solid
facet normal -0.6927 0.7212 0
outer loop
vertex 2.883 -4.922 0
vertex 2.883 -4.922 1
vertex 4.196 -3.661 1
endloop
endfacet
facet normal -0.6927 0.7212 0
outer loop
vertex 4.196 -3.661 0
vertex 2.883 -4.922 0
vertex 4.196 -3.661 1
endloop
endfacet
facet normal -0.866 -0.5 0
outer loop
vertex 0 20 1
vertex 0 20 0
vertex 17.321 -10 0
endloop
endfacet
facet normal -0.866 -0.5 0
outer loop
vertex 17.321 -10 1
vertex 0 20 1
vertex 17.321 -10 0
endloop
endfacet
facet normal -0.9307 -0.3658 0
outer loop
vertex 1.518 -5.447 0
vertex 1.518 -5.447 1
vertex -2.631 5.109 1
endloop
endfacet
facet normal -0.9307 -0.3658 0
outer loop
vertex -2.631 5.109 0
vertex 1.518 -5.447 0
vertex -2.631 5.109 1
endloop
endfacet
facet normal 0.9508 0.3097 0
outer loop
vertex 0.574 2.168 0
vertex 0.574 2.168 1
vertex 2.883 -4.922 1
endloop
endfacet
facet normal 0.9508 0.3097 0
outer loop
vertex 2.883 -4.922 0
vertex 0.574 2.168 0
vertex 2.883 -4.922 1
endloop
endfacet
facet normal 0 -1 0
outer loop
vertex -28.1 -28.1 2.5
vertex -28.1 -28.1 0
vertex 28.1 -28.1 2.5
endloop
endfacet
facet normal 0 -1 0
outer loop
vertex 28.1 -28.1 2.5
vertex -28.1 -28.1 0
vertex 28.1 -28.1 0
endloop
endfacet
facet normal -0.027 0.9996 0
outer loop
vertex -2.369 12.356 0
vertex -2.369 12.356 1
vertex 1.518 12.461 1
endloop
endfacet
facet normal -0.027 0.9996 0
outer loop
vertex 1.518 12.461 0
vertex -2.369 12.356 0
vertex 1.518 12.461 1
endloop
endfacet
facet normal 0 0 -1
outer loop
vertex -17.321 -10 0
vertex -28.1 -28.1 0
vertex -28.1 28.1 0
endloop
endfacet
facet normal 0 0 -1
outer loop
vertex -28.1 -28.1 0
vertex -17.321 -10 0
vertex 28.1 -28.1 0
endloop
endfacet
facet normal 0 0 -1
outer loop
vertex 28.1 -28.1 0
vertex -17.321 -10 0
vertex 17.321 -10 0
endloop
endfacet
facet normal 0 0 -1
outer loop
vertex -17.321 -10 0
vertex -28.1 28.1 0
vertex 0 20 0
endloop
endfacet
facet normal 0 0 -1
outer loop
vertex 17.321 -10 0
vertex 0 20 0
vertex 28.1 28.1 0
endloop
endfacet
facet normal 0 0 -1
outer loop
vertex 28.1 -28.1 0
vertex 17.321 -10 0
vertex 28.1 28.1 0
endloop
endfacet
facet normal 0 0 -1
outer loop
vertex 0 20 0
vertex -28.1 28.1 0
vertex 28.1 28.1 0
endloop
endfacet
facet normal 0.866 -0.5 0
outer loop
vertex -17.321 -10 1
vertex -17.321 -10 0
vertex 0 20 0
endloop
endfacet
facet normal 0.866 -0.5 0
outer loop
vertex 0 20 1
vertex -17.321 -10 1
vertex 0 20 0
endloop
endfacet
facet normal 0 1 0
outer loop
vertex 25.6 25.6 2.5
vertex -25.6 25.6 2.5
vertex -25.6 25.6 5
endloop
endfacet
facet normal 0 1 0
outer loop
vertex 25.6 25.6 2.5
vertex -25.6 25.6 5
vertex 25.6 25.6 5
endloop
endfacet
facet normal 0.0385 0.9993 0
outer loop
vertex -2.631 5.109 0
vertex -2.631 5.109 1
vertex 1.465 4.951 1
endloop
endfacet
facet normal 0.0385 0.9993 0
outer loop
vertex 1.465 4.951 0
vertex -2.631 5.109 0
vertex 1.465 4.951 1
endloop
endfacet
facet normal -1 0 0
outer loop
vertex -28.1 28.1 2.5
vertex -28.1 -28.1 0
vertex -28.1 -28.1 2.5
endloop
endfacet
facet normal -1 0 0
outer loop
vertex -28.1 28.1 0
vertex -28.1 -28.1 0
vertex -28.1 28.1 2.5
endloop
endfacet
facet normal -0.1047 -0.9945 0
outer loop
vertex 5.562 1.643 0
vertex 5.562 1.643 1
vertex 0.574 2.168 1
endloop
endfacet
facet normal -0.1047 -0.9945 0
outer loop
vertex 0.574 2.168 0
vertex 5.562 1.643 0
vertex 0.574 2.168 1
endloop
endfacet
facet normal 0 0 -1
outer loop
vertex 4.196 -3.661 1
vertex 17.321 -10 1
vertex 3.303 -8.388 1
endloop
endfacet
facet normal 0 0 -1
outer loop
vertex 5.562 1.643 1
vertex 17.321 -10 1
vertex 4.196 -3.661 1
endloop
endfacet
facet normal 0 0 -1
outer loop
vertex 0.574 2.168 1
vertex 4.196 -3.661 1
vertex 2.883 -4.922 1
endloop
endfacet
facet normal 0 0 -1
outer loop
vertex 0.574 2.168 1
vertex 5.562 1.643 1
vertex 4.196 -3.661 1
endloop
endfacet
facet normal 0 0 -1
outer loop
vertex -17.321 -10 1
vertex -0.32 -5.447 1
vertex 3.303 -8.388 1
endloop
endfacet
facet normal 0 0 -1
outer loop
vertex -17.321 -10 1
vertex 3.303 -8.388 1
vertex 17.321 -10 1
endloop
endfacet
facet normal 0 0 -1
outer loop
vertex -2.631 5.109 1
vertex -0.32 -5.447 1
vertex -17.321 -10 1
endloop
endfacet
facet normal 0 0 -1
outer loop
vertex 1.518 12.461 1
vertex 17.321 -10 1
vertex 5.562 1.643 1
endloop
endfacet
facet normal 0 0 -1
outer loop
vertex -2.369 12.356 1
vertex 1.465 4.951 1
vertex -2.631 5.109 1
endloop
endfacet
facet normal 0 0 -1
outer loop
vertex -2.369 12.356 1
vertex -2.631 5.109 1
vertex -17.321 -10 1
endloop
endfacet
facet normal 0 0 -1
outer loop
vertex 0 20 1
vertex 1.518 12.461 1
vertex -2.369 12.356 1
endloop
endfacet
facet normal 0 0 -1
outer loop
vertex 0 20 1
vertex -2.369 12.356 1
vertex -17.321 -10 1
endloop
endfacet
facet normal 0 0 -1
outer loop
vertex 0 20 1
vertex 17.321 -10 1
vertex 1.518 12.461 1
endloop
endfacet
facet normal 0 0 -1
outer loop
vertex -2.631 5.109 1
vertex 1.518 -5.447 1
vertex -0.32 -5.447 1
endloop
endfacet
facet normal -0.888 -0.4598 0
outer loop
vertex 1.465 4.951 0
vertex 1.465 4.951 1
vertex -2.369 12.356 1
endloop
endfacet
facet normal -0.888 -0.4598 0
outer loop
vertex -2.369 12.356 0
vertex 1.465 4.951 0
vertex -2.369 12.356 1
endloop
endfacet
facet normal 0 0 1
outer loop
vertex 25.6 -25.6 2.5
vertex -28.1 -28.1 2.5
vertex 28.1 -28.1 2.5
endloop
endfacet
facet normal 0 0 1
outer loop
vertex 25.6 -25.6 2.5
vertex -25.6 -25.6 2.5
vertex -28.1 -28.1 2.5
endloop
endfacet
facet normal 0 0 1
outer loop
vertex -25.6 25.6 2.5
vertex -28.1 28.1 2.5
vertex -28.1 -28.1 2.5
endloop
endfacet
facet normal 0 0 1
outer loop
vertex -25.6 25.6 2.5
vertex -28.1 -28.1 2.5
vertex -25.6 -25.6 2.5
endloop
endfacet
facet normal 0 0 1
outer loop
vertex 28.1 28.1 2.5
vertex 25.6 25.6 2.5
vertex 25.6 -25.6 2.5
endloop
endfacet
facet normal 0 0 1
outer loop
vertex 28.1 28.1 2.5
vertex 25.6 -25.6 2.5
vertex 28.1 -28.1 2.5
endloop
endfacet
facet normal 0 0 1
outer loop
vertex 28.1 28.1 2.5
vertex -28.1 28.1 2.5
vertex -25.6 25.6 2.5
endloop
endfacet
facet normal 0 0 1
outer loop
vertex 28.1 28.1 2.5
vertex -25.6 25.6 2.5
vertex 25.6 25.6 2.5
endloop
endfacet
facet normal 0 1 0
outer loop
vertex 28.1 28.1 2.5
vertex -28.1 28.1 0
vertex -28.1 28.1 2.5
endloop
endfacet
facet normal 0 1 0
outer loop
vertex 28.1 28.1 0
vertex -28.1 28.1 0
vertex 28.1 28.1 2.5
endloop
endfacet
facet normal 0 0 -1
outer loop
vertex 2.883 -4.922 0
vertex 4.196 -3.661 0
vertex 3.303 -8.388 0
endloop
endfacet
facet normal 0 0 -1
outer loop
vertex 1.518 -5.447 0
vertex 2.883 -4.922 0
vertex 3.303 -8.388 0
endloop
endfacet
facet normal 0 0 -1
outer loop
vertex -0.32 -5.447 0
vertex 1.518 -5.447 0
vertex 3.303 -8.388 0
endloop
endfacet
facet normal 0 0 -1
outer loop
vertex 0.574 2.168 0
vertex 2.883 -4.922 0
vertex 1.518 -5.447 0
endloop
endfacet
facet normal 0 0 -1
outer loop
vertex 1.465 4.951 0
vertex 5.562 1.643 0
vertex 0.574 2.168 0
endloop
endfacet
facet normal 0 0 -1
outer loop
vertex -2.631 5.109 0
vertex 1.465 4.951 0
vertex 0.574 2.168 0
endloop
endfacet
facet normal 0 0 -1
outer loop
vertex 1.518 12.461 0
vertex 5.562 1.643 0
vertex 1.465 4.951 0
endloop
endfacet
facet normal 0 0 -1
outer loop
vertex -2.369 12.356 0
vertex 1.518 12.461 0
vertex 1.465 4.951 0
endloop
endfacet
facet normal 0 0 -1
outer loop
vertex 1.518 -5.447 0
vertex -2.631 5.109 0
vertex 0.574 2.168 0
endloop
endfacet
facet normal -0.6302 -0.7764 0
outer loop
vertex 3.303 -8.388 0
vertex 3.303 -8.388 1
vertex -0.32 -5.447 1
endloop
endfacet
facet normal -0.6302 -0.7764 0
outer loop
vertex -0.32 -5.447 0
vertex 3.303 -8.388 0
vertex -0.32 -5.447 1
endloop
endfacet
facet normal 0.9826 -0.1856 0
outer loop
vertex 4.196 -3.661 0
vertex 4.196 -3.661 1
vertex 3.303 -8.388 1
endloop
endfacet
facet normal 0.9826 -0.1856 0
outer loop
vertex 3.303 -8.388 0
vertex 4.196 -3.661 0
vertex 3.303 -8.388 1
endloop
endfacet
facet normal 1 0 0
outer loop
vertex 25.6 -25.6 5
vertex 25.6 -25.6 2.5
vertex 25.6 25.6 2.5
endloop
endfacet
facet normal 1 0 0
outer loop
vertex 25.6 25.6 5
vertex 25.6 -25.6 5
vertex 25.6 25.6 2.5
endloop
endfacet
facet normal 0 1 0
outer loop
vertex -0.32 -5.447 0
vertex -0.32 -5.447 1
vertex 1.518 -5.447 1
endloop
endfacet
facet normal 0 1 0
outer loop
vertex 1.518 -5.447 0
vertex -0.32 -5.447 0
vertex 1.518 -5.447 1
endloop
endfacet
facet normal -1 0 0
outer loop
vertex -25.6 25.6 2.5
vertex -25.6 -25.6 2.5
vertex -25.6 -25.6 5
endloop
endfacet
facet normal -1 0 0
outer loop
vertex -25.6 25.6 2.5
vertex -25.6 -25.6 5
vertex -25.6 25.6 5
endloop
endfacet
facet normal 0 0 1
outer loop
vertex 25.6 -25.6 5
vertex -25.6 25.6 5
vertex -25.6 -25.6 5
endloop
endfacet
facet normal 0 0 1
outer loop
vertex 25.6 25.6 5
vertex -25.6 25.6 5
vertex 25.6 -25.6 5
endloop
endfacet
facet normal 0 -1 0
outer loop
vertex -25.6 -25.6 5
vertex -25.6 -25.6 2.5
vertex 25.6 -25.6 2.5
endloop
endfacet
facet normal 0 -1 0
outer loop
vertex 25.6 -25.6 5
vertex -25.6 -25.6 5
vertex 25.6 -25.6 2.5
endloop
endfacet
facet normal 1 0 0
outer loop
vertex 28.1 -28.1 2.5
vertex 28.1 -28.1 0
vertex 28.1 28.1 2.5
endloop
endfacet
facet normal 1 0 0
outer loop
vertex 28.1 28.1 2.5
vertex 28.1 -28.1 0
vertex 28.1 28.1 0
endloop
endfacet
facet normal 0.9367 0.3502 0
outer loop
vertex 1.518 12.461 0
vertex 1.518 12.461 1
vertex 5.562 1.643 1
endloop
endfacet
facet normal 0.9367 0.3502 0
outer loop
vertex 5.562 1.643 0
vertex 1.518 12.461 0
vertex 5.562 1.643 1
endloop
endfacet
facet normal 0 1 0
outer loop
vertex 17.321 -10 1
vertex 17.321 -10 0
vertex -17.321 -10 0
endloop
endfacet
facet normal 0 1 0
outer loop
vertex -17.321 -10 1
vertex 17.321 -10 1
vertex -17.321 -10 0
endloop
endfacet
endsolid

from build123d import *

# Parameters (mm, degrees)
SKETCH2_W           = 56.2
SKETCH2_H           = 56.2
BOSS_EXTRUDE1_DEPTH = 2.5
SKETCH3_W           = 51.2
SKETCH3_H           = 51.2
BOSS_EXTRUDE2_DEPTH = 2.5
CUT_EXTRUDE1_DEPTH  = 1
BOSS_EXTRUDE3_DEPTH = 1


with BuildPart() as part:
    # Sketch2 → Boss-Extrude1 (new body)
    with BuildSketch(Plane.XY):
        Rectangle(SKETCH2_W, SKETCH2_H)
    extrude(amount=BOSS_EXTRUDE1_DEPTH)

    # Sketch3 → Boss-Extrude2 (add)
    with BuildSketch(Plane.XY.offset(2.5)):
        Rectangle(SKETCH3_W, SKETCH3_H)
    extrude(amount=BOSS_EXTRUDE2_DEPTH)

    # Sketch4 → Cut-Extrude1 (cut)
    with BuildSketch(Plane(origin=(0, 0, 0), x_dir=(-1, 0, 0), z_dir=(0, 0, -1))):
        Polygon((0, 20), (-17.320508076, -10), (17.320508076, -10), align=None)
    extrude(amount=-CUT_EXTRUDE1_DEPTH, mode=Mode.SUBTRACT)

    # Sketch5 → Boss-Extrude3 (add)
    with BuildSketch(Plane(origin=(0, 0, 1), x_dir=(-1, 0, 0), z_dir=(0, 0, -1))):
        Polygon((-1.517755642, 12.461495331), (-5.561610901, 1.642869574), (-0.574357926, 2.168045581), (-2.883213262, -4.921830522), (-4.196153281, -3.661408103), (-3.303354068, -8.387992172), (0.320360384, -5.447006529), (-1.517755642, -5.447006529), (2.631134818, 5.109031224), (-1.465238042, 4.951478422), (2.368546814, 12.356460129), align=None)
    extrude(amount=BOSS_EXTRUDE3_DEPTH)


solid = part.part
